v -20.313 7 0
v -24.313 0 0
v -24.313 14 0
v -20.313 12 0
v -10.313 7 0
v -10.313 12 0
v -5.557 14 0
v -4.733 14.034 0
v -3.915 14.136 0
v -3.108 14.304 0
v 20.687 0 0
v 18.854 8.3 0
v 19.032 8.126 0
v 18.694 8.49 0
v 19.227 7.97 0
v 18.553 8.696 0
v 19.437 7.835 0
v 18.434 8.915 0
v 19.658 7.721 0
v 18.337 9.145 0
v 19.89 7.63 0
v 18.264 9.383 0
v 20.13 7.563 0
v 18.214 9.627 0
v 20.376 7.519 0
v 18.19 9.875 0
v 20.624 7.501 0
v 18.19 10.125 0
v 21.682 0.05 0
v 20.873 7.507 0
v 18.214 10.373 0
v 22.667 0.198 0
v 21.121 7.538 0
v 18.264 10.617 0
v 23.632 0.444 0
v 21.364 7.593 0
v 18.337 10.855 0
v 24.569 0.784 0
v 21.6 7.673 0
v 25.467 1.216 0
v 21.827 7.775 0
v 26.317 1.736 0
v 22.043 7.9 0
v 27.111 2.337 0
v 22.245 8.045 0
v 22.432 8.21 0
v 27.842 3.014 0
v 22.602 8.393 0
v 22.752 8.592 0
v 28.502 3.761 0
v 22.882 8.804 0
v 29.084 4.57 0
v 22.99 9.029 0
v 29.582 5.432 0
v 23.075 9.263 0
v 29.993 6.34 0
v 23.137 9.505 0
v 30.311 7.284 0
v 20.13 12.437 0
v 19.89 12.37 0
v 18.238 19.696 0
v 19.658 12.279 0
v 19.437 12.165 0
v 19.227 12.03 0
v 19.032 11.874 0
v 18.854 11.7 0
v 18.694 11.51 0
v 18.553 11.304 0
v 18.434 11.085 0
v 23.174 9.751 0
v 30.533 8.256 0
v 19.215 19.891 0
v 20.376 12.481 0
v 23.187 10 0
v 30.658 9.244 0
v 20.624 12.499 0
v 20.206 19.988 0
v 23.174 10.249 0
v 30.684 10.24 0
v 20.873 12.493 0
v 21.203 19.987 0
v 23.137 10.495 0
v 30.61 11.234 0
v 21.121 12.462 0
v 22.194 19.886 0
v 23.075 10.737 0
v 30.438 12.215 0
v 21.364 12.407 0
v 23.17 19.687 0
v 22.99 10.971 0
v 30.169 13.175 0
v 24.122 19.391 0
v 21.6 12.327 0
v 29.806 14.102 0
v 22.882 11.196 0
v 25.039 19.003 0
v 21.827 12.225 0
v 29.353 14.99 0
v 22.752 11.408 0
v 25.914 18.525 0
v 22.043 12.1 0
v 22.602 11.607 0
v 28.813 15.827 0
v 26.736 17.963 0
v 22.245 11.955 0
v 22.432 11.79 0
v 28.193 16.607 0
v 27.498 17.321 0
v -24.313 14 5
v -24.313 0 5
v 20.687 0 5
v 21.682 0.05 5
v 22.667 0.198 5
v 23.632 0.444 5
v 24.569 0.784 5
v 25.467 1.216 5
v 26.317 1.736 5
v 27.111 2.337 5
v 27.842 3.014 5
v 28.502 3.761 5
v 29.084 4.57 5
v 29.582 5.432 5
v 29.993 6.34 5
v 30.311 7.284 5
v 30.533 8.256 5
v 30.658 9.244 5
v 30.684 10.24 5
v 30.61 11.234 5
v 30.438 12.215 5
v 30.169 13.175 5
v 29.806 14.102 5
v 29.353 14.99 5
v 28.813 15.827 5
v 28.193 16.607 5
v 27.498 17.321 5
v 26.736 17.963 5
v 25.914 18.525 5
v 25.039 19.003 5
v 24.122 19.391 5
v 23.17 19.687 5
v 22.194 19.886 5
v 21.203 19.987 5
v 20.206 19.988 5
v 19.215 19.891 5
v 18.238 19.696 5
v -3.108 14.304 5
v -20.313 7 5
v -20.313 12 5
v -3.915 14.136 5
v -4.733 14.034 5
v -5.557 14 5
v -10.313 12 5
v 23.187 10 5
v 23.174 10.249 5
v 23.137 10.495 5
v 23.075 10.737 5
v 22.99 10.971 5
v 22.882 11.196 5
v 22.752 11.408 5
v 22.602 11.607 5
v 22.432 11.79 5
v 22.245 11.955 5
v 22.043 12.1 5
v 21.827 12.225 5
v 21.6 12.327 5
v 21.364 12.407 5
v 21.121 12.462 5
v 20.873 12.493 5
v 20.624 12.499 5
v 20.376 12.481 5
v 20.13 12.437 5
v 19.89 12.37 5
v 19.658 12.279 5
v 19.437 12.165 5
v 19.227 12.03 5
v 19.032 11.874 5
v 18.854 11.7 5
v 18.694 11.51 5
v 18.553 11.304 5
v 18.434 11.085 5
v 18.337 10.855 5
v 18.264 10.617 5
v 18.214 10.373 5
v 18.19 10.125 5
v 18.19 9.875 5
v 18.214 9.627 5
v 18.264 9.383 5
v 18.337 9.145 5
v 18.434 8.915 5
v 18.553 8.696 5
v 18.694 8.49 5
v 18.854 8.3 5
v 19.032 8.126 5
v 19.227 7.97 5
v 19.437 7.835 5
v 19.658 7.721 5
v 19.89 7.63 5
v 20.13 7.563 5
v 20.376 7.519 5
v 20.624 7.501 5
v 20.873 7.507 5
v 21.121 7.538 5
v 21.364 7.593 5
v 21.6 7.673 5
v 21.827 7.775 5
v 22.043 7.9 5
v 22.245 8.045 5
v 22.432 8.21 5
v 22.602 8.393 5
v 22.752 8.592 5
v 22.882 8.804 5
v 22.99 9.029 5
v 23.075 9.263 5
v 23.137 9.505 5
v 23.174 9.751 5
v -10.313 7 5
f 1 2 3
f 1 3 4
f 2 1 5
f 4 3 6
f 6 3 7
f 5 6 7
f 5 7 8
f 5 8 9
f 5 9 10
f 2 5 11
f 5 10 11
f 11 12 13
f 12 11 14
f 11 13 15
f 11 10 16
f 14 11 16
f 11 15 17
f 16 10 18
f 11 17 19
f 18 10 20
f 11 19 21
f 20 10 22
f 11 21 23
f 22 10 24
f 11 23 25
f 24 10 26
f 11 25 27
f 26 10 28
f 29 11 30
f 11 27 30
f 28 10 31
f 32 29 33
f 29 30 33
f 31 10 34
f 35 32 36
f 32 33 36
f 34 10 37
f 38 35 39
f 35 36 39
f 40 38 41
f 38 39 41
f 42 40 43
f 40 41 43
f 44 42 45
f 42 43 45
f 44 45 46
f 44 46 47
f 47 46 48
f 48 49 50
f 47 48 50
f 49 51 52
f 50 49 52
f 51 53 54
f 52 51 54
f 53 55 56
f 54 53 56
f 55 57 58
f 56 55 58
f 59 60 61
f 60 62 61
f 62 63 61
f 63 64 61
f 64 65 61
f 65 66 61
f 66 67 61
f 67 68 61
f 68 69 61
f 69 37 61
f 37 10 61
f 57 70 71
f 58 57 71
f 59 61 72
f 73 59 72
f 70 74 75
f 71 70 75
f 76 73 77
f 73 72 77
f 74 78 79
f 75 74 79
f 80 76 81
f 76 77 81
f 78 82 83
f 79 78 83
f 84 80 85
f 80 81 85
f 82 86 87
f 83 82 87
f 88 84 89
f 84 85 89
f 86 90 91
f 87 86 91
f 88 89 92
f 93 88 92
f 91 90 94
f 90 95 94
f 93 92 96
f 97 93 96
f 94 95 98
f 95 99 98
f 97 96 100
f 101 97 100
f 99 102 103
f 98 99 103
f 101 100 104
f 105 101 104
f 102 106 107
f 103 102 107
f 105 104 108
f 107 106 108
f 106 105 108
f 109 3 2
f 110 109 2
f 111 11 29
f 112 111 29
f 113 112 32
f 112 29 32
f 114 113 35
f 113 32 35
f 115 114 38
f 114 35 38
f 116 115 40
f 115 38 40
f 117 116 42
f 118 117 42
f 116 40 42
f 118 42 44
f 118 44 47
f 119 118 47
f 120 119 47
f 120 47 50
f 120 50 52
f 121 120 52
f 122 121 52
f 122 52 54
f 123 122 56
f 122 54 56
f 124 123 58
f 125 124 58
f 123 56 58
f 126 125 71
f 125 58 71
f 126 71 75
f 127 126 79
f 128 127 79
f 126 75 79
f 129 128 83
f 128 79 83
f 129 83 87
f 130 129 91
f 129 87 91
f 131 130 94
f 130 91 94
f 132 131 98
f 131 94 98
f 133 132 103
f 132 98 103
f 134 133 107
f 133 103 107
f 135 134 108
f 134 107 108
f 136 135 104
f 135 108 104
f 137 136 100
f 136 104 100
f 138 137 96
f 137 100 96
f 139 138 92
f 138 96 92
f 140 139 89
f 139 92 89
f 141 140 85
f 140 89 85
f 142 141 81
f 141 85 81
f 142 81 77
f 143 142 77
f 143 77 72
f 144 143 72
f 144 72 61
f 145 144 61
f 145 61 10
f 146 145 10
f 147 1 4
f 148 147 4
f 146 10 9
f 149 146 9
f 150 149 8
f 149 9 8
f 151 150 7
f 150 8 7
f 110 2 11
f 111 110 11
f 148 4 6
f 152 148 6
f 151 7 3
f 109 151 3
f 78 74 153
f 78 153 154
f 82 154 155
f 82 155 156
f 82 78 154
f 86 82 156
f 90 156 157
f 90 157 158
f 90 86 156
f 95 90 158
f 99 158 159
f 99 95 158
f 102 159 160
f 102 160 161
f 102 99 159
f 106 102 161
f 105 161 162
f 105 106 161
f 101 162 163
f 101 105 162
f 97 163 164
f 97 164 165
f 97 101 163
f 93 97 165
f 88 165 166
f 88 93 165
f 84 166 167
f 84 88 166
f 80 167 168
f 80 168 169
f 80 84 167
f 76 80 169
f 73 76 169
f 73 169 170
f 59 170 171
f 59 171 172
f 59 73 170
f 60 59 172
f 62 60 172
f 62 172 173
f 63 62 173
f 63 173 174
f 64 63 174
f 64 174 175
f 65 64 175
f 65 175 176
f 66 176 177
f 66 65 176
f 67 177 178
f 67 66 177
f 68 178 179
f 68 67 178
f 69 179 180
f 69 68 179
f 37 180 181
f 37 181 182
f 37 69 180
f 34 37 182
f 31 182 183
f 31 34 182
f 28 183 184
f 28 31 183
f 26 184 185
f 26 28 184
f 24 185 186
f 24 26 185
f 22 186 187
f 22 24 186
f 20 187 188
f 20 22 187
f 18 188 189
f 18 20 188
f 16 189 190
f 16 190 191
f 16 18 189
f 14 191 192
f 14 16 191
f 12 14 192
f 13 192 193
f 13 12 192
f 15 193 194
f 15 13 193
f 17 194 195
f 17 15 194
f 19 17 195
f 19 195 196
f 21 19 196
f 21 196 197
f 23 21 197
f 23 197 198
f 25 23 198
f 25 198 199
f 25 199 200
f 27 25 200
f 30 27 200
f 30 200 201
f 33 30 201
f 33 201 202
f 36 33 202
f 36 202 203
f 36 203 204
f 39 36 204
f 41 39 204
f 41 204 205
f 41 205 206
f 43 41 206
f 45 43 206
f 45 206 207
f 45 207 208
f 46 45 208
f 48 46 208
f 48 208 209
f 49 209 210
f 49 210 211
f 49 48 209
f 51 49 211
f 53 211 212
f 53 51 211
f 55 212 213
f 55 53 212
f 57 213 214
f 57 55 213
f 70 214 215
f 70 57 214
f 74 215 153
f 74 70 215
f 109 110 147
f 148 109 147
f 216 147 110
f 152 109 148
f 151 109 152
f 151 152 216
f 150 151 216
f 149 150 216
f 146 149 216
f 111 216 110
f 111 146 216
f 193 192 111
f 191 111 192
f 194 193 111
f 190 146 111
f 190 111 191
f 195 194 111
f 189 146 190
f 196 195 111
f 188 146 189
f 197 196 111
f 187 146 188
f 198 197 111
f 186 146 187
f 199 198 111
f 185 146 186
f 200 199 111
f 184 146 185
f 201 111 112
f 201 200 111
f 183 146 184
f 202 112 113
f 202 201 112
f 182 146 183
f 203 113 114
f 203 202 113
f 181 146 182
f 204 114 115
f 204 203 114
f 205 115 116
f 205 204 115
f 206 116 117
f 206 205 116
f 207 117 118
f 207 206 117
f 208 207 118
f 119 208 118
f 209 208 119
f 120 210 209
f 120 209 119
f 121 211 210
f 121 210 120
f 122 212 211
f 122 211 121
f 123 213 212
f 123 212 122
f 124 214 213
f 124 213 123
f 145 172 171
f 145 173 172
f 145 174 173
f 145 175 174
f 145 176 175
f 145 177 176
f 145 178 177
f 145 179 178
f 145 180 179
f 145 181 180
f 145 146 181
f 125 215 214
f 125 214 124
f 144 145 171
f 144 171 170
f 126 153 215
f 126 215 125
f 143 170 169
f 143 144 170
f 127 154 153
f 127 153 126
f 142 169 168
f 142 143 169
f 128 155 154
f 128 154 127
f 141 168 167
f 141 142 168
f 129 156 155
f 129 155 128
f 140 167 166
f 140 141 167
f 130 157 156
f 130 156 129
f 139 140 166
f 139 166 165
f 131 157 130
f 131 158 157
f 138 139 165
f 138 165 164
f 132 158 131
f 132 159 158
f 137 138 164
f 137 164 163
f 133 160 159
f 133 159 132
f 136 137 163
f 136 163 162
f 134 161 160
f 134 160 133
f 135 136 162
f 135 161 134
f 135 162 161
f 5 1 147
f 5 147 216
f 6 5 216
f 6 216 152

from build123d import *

# Parameters (mm, degrees)
SKETCH1_R           = 2.5
SKETCH1_W           = 10
SKETCH1_H           = 5
BOSS_EXTRUDE1_DEPTH = 5


with BuildPart() as part:
    # Sketch1 → Boss-Extrude1 (new body)
    with BuildSketch(Plane.XY):
        with BuildLine():
            Line((-24.313432836, 0), (20.686567164, 0))
            ThreePointArc((20.686567164, 0), (30.610164404, 11.23378192), (18.237856194, 19.695556435))
            Line((18.237856194, 19.695556435), (-3.108002795, 14.304443565))
            ThreePointArc((-3.108002795, 14.304443565), (-4.322931845, 14.07640276), (-5.556713765, 14))
            Line((-5.556713765, 14), (-24.313432836, 14))
            Line((-24.313432836, 14), (-24.313432836, 0))
        make_face()
        with Locations((20.686567164, 10)):
            Circle(SKETCH1_R, mode=Mode.SUBTRACT)
        with Locations((-15.313432836, 9.5)):
            Rectangle(SKETCH1_W, SKETCH1_H, mode=Mode.SUBTRACT)
    extrude(amount=BOSS_EXTRUDE1_DEPTH)


solid = part.part
